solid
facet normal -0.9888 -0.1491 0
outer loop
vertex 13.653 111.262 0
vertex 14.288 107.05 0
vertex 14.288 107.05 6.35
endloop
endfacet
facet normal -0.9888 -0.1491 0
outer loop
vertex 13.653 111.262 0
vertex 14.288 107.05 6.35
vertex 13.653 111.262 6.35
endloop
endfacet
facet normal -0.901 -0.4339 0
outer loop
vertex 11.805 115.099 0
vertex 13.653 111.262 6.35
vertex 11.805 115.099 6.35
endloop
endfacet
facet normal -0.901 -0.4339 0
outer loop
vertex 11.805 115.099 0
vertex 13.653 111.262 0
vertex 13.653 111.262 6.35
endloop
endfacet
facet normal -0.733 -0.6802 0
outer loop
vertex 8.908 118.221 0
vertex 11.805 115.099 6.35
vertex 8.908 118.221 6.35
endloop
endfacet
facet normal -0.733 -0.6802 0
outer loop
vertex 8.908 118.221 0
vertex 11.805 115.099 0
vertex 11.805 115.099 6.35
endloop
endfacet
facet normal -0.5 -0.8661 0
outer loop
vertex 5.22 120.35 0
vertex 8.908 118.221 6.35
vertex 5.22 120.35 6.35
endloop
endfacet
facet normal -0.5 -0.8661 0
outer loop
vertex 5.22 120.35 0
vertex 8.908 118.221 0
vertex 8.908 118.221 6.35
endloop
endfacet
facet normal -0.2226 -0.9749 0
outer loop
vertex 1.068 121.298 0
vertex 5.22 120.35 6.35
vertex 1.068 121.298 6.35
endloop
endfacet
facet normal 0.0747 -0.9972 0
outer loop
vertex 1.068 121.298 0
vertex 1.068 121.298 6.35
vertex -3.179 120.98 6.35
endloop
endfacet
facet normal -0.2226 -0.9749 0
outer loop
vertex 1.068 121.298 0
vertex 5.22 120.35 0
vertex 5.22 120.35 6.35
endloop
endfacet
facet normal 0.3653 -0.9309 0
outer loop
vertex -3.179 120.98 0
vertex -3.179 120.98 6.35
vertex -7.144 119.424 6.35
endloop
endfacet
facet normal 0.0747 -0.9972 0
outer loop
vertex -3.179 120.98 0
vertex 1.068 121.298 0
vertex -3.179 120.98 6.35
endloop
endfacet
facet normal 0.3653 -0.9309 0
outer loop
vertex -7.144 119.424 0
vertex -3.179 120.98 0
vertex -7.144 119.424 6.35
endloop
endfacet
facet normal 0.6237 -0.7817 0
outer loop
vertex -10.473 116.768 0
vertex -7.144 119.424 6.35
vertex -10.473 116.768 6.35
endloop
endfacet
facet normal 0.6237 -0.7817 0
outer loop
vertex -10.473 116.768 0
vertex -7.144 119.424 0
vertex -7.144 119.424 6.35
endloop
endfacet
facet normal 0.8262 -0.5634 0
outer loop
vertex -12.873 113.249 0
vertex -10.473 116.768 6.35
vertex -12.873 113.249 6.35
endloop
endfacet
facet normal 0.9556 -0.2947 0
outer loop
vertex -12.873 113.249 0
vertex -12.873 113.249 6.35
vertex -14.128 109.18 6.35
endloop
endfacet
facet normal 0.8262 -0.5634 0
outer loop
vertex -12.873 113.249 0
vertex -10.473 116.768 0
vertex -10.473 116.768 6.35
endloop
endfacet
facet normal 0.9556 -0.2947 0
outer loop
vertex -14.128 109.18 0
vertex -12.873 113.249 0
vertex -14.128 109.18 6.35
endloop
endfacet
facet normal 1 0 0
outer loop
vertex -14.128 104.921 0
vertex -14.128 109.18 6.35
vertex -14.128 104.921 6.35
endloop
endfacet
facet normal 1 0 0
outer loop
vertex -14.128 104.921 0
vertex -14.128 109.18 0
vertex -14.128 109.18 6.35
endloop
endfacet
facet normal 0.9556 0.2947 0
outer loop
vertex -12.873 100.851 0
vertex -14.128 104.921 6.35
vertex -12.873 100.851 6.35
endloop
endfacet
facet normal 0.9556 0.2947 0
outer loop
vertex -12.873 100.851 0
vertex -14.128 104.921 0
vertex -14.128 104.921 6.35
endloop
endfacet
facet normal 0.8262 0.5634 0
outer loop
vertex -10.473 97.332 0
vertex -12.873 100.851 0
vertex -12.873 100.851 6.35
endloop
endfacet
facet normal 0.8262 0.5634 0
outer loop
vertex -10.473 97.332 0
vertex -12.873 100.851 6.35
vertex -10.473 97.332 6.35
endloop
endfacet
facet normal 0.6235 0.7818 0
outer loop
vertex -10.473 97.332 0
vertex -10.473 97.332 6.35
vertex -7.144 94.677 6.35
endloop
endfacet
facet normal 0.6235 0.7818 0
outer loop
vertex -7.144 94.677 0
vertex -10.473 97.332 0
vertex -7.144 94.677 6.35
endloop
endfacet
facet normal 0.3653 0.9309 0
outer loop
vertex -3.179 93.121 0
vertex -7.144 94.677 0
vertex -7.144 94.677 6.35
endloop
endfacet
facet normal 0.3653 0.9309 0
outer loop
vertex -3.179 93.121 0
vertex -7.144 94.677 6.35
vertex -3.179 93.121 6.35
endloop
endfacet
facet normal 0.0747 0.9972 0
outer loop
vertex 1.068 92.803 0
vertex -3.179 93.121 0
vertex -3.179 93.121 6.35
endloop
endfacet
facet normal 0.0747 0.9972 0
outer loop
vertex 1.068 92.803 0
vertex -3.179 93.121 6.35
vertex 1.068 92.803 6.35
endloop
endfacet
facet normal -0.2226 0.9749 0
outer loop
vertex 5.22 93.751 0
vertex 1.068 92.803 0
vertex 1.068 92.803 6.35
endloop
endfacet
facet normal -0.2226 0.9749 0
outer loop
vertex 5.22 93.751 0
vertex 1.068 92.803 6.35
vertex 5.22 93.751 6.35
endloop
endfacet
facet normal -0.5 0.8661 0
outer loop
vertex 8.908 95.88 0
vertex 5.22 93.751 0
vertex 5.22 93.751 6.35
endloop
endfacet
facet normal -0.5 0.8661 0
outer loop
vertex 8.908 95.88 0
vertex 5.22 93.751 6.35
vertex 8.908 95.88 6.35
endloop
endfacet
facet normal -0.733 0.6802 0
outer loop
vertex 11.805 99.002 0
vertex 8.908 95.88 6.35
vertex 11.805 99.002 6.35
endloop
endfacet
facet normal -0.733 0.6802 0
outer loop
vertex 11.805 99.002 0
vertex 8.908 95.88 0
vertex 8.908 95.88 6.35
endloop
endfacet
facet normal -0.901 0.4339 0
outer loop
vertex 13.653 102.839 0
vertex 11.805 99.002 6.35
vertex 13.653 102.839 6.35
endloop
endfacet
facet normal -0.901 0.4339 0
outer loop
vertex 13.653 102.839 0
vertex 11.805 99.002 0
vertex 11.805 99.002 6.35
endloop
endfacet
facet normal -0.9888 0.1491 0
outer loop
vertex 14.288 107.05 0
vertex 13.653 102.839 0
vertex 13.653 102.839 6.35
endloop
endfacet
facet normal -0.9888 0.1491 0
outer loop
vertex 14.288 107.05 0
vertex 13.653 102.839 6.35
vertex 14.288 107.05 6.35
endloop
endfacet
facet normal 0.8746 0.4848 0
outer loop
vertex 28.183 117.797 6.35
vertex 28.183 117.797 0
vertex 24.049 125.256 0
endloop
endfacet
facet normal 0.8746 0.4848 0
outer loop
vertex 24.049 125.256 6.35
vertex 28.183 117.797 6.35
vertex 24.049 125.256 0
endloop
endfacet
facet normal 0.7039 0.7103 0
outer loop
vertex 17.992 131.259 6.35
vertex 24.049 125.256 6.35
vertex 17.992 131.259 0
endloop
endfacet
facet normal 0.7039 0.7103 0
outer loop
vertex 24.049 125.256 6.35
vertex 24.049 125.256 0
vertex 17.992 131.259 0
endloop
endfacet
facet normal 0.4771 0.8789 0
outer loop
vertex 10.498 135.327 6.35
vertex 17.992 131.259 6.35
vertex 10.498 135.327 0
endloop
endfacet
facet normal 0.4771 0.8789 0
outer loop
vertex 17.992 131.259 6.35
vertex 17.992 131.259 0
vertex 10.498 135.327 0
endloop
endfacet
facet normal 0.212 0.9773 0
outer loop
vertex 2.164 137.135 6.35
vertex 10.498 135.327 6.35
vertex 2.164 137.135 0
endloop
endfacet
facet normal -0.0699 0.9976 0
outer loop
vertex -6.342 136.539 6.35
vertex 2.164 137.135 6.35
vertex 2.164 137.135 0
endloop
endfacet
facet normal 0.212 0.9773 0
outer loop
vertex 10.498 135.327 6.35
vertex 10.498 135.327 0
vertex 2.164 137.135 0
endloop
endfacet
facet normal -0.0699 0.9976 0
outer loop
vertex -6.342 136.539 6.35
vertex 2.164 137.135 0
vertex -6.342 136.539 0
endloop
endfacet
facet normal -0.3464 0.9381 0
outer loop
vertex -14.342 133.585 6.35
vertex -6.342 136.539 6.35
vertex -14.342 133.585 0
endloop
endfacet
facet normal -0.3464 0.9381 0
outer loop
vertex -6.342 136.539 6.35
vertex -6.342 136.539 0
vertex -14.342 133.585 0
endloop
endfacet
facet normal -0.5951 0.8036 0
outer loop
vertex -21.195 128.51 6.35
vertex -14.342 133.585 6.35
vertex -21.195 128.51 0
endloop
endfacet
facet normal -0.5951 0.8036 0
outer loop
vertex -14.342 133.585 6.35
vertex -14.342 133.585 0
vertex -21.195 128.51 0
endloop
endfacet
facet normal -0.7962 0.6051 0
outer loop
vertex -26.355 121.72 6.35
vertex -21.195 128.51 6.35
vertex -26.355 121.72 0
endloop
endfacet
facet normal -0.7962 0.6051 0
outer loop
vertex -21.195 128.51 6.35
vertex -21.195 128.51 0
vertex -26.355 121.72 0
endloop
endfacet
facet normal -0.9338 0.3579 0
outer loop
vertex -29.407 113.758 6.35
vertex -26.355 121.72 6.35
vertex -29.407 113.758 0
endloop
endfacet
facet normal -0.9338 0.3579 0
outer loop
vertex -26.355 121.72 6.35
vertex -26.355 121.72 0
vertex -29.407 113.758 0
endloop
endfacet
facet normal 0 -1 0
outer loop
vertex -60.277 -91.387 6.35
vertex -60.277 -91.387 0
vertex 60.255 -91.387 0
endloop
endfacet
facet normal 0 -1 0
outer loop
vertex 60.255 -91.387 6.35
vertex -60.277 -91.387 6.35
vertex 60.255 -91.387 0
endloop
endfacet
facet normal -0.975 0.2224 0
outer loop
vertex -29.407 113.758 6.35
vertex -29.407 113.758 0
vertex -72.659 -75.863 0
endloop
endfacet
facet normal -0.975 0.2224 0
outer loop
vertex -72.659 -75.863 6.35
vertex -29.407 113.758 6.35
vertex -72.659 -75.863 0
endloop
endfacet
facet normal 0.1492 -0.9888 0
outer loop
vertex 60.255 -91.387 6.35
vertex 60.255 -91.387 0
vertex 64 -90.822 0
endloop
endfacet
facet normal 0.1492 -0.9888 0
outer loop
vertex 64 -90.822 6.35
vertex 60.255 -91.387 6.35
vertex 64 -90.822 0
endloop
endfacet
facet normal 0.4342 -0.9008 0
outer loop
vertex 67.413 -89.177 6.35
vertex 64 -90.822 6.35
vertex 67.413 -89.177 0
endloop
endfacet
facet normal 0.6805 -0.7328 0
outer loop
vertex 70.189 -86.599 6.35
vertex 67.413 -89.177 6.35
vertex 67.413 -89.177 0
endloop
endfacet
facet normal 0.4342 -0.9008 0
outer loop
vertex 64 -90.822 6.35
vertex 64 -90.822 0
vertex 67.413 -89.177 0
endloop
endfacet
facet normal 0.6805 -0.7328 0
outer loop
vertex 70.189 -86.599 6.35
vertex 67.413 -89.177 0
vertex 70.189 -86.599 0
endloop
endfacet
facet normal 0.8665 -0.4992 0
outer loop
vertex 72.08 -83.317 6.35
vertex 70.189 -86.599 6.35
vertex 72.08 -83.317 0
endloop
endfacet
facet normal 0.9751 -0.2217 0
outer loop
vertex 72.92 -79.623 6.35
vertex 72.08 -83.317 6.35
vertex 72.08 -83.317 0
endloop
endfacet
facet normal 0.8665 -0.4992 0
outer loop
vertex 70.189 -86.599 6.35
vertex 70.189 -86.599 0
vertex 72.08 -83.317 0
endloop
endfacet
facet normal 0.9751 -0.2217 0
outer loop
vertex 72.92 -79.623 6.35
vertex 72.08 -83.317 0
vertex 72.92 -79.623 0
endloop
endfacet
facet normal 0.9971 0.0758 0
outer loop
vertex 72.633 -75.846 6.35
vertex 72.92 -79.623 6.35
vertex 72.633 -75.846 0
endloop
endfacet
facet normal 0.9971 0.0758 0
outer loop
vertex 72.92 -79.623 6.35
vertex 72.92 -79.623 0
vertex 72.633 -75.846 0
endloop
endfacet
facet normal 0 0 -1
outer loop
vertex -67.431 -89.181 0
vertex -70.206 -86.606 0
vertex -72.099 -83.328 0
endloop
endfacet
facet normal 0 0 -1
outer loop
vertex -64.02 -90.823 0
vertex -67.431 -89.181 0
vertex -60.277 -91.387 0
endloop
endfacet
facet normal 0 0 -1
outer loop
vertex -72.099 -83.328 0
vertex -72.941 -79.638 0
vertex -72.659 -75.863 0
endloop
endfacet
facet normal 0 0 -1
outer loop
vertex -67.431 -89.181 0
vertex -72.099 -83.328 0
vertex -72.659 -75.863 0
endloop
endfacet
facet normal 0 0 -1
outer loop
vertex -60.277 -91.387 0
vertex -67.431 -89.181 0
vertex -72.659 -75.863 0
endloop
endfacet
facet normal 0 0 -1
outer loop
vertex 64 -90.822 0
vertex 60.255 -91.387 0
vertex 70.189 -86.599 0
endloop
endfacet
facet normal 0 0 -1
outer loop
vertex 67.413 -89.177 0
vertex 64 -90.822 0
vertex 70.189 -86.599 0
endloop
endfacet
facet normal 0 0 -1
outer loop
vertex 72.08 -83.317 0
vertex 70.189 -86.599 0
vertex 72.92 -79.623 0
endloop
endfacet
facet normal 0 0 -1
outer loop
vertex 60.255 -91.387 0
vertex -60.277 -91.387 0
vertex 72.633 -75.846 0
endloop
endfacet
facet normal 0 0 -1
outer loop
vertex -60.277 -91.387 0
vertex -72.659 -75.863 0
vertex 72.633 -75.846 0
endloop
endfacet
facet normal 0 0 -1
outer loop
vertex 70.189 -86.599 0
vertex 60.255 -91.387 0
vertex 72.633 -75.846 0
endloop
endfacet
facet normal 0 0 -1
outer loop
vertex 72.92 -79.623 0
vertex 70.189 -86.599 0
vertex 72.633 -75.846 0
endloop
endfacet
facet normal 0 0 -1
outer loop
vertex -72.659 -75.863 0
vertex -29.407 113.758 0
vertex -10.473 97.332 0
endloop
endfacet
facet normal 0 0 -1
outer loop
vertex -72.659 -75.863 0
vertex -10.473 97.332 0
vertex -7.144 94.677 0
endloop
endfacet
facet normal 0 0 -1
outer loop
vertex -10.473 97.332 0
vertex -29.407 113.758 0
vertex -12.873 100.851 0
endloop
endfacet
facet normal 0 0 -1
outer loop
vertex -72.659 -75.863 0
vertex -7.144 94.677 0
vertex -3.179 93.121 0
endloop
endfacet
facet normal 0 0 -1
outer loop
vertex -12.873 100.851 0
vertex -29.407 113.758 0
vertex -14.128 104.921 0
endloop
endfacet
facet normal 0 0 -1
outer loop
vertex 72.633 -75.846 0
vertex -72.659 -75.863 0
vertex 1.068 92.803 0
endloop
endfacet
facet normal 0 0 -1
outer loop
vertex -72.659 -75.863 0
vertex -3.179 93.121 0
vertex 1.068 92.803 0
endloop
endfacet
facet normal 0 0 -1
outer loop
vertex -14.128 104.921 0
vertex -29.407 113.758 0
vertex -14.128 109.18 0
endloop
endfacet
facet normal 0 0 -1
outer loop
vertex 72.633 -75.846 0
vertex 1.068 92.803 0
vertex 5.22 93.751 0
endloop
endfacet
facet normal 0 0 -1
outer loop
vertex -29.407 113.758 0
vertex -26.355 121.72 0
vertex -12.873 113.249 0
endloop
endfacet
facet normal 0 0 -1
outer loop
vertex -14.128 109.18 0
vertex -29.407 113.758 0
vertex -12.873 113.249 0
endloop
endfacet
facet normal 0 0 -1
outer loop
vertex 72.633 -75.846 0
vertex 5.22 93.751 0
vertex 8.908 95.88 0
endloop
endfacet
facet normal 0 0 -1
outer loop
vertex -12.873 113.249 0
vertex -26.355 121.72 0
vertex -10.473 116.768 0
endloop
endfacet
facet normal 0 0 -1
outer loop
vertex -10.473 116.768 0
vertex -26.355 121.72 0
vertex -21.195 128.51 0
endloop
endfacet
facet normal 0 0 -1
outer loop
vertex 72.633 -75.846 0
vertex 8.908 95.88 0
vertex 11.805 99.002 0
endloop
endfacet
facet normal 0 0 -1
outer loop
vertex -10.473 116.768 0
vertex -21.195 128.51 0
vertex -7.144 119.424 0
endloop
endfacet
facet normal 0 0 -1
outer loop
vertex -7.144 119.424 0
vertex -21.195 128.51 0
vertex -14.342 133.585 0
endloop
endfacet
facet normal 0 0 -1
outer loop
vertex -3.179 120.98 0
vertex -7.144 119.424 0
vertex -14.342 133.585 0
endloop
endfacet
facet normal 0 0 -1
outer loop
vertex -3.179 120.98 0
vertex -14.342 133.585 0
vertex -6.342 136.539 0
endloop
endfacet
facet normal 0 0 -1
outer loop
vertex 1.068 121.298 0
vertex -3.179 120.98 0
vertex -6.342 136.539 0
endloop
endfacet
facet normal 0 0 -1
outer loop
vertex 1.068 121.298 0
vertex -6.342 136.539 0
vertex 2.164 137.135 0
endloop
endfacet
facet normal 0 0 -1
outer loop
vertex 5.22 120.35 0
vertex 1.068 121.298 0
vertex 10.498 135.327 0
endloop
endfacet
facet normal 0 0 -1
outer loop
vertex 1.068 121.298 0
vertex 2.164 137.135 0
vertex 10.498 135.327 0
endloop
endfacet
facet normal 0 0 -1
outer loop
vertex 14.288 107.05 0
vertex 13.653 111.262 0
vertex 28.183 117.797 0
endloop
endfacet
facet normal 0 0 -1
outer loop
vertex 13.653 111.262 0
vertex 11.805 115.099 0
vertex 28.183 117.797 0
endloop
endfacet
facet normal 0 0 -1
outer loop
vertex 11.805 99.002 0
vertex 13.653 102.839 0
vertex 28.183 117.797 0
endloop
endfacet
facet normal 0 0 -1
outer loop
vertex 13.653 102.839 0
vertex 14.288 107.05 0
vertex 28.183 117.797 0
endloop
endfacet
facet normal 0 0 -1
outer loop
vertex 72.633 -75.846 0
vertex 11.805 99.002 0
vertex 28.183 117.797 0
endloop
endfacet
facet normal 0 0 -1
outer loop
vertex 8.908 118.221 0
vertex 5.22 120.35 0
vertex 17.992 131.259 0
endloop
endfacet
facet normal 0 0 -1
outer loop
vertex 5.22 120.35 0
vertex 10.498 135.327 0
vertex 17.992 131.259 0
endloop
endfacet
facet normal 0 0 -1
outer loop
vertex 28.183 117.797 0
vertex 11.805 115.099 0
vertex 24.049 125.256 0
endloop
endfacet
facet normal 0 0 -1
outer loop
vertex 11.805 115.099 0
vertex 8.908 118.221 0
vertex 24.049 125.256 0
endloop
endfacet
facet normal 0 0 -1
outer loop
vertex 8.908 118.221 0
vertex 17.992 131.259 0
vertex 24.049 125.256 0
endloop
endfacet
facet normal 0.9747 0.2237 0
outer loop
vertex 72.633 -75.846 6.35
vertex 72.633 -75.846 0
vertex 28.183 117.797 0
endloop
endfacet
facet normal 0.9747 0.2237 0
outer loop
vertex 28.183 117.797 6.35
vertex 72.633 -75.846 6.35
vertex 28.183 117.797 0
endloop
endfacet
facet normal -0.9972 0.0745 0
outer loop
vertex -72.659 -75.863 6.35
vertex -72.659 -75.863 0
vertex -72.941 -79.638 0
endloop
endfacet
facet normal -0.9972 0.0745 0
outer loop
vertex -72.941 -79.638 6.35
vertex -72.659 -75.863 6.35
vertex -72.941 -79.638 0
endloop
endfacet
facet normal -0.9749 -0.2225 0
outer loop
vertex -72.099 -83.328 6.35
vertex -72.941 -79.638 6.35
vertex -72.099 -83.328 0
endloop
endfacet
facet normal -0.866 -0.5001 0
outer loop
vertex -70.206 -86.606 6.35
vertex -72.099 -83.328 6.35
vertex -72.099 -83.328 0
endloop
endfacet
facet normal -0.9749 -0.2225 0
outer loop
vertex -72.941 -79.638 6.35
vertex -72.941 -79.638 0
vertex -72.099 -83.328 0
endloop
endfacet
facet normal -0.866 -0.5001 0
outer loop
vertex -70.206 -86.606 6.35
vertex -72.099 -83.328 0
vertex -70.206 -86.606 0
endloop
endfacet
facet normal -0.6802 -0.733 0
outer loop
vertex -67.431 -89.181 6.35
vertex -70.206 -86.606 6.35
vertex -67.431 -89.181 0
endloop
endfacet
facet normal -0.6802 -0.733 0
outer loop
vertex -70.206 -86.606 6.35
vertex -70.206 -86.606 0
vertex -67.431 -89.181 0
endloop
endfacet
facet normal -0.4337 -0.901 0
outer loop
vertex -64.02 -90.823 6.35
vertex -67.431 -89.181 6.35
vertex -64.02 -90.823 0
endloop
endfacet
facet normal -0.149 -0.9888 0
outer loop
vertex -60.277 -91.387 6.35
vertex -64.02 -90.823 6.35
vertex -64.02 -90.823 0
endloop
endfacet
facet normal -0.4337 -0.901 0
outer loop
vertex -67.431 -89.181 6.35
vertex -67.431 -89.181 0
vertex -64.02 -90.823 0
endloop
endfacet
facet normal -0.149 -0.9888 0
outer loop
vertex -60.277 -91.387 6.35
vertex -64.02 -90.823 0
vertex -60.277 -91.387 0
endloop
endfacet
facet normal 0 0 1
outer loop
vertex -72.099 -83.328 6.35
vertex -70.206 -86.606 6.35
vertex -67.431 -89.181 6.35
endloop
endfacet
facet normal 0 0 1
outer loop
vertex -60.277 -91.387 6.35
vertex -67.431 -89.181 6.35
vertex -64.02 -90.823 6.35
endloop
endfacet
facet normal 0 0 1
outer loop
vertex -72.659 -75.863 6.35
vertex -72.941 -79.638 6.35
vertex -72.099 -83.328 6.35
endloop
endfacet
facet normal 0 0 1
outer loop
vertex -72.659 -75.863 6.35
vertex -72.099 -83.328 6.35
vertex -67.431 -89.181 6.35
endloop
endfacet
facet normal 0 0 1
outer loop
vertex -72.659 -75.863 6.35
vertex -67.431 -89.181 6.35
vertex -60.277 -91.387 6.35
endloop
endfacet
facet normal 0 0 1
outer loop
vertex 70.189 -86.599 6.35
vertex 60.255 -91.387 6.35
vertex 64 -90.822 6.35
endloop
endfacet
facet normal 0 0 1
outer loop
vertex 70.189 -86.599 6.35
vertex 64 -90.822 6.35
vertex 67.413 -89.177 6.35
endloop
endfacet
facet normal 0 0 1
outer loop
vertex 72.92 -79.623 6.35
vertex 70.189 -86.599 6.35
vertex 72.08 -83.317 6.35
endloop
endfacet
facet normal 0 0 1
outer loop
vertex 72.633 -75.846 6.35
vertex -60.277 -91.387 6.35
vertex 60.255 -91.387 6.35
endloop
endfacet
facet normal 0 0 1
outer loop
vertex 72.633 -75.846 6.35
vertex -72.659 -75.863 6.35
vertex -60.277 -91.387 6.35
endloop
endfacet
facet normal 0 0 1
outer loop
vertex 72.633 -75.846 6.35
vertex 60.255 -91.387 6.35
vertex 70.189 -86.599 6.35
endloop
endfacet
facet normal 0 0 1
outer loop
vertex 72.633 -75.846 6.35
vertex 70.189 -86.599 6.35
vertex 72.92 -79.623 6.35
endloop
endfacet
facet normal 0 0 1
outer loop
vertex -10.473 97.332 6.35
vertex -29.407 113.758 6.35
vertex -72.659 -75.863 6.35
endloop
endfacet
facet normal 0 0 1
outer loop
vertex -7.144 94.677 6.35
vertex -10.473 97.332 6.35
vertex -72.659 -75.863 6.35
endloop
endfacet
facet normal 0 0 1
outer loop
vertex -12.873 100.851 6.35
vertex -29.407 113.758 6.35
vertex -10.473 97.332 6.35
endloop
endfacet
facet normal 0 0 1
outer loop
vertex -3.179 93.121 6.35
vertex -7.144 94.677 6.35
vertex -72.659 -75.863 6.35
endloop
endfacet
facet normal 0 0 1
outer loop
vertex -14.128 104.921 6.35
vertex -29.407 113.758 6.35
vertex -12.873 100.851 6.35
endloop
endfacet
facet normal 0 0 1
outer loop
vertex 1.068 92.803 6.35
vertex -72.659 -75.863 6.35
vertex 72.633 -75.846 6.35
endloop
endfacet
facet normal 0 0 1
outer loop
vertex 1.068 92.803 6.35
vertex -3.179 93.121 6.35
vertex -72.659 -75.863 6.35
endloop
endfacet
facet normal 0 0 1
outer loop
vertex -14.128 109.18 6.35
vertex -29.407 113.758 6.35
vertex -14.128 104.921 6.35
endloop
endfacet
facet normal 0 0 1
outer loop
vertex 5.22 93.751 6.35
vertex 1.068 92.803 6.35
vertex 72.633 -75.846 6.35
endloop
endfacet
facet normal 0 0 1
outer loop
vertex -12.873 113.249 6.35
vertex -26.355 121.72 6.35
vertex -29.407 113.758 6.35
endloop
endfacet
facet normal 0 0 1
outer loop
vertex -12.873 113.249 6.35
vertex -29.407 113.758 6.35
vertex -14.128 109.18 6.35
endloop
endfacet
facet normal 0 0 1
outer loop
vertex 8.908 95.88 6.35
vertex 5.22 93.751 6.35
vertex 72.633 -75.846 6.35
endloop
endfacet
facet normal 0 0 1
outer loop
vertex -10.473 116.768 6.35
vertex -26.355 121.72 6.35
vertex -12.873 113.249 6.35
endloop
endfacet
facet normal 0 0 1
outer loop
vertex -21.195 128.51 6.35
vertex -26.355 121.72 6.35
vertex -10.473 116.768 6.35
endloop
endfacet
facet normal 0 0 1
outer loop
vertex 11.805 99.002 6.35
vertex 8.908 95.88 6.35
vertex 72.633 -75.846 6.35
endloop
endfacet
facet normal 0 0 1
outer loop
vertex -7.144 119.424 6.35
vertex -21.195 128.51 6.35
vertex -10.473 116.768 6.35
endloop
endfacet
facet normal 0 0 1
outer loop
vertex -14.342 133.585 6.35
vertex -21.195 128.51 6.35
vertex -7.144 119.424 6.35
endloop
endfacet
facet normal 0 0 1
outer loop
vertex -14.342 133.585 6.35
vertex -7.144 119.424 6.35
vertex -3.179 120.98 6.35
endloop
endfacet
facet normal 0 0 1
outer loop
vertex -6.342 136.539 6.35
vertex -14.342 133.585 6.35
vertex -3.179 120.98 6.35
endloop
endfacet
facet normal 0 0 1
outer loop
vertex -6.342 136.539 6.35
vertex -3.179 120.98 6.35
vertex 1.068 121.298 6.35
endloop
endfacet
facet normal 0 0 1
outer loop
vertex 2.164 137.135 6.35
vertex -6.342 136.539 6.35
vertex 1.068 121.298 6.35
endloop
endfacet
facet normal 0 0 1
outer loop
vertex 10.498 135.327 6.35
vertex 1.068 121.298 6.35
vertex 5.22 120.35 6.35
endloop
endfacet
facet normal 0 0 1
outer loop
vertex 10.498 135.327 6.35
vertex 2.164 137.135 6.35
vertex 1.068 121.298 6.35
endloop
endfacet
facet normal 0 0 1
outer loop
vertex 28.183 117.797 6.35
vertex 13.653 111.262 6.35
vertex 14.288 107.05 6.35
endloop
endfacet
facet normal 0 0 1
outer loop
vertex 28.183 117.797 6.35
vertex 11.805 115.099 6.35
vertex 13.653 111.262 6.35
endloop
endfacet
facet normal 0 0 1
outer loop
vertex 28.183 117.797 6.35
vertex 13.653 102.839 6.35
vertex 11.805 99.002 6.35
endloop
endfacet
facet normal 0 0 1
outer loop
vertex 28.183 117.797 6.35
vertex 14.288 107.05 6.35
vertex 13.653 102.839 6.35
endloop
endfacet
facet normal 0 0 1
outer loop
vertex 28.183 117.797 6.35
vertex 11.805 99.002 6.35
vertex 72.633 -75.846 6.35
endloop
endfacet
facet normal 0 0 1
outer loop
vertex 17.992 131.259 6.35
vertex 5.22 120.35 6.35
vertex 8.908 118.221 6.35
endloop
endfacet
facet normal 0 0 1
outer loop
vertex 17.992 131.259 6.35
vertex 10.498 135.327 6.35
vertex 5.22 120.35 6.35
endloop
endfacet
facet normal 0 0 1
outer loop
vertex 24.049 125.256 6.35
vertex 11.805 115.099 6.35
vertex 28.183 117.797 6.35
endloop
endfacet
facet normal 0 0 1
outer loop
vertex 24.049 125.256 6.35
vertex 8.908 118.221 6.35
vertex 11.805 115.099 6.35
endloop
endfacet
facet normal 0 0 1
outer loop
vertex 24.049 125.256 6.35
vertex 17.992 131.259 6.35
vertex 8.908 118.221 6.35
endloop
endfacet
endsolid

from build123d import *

# Parameters (mm, degrees)
F0_R     = 14.2875
F1_DEPTH = 6.35


with BuildPart() as f1:
    # F0 (on Top) → F1 (new body)
    with BuildSketch(Plane.XY):
        with BuildLine():
            ThreePointArc((-72.658973, -75.862842), (-70.205698, -86.606139), (-60.276993, -91.387123))
            Line((-60.276993, -91.387123), (60.254503, -91.387123))
            ThreePointArc((60.254503, -91.387123), (70.188653, -86.599307), (72.632586, -75.845809))
            Line((72.632586, -75.845809), (28.183001, 117.79723))
            ThreePointArc((28.183001, 117.79723), (-2.110314, 137.138963), (-29.407204, 113.758043))
            Line((-29.407204, 113.758043), (-72.658973, -75.862842))
        make_face()
        with Locations((0, 107.050377)):
            Circle(F0_R, mode=Mode.SUBTRACT)
    extrude(amount=F1_DEPTH)


solid = f1.part
